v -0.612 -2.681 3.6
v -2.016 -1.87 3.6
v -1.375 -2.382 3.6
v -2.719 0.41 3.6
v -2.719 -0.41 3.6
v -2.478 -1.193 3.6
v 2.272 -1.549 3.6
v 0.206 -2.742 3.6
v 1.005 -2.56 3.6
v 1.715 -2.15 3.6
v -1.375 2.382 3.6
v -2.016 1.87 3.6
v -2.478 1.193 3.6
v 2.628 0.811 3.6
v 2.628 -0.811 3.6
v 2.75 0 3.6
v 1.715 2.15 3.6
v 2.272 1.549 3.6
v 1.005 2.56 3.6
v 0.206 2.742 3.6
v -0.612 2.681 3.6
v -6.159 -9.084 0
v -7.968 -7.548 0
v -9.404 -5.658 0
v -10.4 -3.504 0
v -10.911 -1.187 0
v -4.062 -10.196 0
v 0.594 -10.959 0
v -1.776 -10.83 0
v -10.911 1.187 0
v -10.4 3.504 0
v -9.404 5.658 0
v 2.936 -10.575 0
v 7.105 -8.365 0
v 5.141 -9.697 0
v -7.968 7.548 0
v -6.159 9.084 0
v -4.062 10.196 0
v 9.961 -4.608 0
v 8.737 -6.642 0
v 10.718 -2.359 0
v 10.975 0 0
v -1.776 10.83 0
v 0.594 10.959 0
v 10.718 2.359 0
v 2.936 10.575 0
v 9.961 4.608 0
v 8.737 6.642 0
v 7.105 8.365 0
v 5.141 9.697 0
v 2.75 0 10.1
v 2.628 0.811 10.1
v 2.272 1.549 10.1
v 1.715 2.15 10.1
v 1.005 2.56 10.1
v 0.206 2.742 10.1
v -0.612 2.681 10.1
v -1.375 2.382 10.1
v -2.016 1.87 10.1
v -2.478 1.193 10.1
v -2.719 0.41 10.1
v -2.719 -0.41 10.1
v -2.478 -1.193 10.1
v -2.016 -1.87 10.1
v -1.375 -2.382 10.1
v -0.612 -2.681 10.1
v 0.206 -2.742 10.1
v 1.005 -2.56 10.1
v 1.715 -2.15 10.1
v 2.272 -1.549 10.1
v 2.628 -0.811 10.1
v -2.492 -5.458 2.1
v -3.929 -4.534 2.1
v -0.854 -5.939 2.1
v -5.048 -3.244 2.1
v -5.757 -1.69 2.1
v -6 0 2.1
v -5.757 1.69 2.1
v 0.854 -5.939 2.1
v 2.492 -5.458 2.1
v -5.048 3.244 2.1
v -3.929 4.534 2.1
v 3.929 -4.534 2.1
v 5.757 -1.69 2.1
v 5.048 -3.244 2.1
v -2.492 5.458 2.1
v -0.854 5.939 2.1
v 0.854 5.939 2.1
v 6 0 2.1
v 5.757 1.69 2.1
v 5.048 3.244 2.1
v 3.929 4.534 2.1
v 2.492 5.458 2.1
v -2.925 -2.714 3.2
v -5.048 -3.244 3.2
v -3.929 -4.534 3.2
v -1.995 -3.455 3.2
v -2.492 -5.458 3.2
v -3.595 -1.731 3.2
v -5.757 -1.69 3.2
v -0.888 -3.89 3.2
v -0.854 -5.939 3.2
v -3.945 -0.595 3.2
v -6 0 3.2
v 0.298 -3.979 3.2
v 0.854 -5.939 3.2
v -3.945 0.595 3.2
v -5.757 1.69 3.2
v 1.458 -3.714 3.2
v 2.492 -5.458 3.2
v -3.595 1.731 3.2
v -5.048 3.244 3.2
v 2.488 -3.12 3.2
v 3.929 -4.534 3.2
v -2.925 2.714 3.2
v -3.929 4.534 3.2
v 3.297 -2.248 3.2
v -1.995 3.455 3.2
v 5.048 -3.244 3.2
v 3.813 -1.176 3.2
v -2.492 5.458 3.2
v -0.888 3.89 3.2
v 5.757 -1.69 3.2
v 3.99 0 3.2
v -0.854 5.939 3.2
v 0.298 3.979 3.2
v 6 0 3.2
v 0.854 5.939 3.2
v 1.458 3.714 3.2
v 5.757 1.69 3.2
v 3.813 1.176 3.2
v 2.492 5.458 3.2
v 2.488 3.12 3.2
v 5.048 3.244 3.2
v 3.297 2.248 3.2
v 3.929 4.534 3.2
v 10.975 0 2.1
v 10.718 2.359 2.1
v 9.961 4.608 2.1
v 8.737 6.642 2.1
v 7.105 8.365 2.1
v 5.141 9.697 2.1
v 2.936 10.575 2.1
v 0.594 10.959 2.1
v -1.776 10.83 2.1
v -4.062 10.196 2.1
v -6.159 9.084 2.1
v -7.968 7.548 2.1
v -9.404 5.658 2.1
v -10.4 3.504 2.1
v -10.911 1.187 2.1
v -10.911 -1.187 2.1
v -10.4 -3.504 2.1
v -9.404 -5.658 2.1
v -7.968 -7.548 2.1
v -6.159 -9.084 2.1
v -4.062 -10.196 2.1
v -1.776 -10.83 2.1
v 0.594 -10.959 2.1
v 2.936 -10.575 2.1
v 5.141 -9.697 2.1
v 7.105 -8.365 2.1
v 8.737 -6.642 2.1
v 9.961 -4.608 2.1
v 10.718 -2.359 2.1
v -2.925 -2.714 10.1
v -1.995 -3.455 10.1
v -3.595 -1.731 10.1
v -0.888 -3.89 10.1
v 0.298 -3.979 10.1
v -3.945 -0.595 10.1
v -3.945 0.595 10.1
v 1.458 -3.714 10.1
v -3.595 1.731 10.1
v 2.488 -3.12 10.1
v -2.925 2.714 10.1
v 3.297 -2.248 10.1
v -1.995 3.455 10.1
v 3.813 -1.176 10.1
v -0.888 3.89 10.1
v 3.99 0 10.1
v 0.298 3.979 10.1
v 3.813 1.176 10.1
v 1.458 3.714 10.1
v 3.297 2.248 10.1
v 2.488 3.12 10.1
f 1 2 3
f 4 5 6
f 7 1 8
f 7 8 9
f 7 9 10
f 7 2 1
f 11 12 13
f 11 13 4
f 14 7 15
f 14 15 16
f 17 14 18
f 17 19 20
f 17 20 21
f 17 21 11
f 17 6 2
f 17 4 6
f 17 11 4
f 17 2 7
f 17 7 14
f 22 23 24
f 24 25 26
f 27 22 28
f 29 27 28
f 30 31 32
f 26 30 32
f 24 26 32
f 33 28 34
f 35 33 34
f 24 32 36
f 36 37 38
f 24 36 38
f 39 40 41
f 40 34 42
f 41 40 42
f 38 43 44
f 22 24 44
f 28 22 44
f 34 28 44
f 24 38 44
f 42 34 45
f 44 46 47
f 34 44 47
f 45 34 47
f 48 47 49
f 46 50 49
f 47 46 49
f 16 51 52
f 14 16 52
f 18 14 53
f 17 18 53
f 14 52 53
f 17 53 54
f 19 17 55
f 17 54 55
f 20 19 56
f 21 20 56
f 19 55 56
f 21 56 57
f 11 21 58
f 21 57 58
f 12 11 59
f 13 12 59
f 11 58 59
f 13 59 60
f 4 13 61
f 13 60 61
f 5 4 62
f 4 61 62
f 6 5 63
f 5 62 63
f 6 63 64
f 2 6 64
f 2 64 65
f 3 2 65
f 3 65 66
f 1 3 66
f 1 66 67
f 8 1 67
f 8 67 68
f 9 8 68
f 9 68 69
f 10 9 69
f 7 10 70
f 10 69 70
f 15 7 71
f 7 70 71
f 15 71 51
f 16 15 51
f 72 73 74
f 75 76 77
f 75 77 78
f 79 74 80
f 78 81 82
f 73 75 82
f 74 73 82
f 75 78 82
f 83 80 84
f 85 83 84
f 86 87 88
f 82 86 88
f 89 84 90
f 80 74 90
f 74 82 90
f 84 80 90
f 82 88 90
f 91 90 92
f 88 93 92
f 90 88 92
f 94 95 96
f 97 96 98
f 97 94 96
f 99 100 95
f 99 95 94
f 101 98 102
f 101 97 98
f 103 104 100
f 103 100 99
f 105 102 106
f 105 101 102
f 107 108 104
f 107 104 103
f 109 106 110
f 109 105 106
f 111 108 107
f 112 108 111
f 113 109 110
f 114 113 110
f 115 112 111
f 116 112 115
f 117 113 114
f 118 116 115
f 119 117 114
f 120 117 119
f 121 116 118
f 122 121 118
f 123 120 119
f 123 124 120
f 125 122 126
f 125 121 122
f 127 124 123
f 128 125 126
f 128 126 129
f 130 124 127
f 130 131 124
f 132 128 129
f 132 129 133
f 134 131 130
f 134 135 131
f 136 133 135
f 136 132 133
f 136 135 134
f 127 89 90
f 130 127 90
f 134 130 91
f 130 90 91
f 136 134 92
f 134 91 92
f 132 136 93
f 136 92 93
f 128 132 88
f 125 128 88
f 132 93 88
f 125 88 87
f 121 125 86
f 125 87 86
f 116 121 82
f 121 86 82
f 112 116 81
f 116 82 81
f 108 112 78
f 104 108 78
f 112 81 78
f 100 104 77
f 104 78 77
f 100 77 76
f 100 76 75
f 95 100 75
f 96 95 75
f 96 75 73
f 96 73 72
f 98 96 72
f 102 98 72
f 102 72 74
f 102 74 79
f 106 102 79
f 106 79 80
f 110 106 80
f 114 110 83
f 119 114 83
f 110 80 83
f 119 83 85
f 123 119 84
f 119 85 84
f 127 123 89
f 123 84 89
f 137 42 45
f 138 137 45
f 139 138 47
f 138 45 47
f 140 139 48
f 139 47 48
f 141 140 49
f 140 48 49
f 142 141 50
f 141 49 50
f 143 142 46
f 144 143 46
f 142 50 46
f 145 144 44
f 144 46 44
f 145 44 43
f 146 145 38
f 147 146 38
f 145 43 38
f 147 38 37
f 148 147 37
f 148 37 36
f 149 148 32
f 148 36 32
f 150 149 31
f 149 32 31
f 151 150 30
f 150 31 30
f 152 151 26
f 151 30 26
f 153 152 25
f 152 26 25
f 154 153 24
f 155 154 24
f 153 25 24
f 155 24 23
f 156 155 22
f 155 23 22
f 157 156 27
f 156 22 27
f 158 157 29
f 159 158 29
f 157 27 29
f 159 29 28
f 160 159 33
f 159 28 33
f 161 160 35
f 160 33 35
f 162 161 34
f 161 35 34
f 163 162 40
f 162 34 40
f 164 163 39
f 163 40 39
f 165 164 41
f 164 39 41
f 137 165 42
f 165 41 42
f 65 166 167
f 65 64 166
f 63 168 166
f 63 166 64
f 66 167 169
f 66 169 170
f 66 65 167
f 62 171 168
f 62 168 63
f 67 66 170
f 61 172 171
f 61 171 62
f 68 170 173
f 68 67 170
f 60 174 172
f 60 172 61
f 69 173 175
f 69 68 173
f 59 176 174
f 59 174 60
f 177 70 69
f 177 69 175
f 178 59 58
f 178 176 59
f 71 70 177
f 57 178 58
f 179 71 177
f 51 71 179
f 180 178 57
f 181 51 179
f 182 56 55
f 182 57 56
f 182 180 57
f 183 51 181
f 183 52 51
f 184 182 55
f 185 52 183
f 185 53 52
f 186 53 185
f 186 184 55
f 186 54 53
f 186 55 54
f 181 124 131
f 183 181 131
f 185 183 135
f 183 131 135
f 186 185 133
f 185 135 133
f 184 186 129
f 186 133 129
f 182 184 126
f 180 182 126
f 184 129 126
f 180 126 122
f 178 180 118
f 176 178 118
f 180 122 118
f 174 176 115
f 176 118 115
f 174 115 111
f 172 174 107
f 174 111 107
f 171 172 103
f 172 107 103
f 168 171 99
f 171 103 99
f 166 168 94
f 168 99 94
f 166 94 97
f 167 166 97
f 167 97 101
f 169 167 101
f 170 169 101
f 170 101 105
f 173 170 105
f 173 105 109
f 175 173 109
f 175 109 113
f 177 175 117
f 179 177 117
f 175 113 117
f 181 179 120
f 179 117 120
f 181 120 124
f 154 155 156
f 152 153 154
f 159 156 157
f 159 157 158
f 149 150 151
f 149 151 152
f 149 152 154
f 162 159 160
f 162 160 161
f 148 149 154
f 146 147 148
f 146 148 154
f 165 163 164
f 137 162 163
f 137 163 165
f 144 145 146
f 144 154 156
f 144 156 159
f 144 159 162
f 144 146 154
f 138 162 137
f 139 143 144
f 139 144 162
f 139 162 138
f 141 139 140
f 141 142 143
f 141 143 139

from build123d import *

# Parameters (mm, degrees)
F0_R     = 10.975
F1_DEPTH = 2.1
F2_R     = 6
F3_DEPTH = 1.1
F4_R     = 3.99
F5_DEPTH = 6.9
F6_R     = 2.75
F7_DEPTH = 6.5


with BuildPart() as f1:
    # F0 (on Top) → F1 (new body)
    with BuildSketch(Plane.XY):
        Circle(F0_R)
    extrude(amount=F1_DEPTH)


with BuildPart() as f3:
    # F2 (on face) → F3 (new body)
    with BuildSketch(Plane.XY.offset(2.1)):
        Circle(F2_R)
    extrude(amount=F3_DEPTH)

    # F4 (on face) → F5 (join)
    with BuildSketch(Plane.XY.offset(3.2)):
        Circle(F4_R)
    extrude(amount=F5_DEPTH)

    # F6 (on face) → F7 (cut)
    with BuildSketch(Plane.XY.offset(10.1)):
        Circle(F6_R)
    extrude(amount=-F7_DEPTH, mode=Mode.SUBTRACT)


solid = Compound([f1.part, f3.part])
